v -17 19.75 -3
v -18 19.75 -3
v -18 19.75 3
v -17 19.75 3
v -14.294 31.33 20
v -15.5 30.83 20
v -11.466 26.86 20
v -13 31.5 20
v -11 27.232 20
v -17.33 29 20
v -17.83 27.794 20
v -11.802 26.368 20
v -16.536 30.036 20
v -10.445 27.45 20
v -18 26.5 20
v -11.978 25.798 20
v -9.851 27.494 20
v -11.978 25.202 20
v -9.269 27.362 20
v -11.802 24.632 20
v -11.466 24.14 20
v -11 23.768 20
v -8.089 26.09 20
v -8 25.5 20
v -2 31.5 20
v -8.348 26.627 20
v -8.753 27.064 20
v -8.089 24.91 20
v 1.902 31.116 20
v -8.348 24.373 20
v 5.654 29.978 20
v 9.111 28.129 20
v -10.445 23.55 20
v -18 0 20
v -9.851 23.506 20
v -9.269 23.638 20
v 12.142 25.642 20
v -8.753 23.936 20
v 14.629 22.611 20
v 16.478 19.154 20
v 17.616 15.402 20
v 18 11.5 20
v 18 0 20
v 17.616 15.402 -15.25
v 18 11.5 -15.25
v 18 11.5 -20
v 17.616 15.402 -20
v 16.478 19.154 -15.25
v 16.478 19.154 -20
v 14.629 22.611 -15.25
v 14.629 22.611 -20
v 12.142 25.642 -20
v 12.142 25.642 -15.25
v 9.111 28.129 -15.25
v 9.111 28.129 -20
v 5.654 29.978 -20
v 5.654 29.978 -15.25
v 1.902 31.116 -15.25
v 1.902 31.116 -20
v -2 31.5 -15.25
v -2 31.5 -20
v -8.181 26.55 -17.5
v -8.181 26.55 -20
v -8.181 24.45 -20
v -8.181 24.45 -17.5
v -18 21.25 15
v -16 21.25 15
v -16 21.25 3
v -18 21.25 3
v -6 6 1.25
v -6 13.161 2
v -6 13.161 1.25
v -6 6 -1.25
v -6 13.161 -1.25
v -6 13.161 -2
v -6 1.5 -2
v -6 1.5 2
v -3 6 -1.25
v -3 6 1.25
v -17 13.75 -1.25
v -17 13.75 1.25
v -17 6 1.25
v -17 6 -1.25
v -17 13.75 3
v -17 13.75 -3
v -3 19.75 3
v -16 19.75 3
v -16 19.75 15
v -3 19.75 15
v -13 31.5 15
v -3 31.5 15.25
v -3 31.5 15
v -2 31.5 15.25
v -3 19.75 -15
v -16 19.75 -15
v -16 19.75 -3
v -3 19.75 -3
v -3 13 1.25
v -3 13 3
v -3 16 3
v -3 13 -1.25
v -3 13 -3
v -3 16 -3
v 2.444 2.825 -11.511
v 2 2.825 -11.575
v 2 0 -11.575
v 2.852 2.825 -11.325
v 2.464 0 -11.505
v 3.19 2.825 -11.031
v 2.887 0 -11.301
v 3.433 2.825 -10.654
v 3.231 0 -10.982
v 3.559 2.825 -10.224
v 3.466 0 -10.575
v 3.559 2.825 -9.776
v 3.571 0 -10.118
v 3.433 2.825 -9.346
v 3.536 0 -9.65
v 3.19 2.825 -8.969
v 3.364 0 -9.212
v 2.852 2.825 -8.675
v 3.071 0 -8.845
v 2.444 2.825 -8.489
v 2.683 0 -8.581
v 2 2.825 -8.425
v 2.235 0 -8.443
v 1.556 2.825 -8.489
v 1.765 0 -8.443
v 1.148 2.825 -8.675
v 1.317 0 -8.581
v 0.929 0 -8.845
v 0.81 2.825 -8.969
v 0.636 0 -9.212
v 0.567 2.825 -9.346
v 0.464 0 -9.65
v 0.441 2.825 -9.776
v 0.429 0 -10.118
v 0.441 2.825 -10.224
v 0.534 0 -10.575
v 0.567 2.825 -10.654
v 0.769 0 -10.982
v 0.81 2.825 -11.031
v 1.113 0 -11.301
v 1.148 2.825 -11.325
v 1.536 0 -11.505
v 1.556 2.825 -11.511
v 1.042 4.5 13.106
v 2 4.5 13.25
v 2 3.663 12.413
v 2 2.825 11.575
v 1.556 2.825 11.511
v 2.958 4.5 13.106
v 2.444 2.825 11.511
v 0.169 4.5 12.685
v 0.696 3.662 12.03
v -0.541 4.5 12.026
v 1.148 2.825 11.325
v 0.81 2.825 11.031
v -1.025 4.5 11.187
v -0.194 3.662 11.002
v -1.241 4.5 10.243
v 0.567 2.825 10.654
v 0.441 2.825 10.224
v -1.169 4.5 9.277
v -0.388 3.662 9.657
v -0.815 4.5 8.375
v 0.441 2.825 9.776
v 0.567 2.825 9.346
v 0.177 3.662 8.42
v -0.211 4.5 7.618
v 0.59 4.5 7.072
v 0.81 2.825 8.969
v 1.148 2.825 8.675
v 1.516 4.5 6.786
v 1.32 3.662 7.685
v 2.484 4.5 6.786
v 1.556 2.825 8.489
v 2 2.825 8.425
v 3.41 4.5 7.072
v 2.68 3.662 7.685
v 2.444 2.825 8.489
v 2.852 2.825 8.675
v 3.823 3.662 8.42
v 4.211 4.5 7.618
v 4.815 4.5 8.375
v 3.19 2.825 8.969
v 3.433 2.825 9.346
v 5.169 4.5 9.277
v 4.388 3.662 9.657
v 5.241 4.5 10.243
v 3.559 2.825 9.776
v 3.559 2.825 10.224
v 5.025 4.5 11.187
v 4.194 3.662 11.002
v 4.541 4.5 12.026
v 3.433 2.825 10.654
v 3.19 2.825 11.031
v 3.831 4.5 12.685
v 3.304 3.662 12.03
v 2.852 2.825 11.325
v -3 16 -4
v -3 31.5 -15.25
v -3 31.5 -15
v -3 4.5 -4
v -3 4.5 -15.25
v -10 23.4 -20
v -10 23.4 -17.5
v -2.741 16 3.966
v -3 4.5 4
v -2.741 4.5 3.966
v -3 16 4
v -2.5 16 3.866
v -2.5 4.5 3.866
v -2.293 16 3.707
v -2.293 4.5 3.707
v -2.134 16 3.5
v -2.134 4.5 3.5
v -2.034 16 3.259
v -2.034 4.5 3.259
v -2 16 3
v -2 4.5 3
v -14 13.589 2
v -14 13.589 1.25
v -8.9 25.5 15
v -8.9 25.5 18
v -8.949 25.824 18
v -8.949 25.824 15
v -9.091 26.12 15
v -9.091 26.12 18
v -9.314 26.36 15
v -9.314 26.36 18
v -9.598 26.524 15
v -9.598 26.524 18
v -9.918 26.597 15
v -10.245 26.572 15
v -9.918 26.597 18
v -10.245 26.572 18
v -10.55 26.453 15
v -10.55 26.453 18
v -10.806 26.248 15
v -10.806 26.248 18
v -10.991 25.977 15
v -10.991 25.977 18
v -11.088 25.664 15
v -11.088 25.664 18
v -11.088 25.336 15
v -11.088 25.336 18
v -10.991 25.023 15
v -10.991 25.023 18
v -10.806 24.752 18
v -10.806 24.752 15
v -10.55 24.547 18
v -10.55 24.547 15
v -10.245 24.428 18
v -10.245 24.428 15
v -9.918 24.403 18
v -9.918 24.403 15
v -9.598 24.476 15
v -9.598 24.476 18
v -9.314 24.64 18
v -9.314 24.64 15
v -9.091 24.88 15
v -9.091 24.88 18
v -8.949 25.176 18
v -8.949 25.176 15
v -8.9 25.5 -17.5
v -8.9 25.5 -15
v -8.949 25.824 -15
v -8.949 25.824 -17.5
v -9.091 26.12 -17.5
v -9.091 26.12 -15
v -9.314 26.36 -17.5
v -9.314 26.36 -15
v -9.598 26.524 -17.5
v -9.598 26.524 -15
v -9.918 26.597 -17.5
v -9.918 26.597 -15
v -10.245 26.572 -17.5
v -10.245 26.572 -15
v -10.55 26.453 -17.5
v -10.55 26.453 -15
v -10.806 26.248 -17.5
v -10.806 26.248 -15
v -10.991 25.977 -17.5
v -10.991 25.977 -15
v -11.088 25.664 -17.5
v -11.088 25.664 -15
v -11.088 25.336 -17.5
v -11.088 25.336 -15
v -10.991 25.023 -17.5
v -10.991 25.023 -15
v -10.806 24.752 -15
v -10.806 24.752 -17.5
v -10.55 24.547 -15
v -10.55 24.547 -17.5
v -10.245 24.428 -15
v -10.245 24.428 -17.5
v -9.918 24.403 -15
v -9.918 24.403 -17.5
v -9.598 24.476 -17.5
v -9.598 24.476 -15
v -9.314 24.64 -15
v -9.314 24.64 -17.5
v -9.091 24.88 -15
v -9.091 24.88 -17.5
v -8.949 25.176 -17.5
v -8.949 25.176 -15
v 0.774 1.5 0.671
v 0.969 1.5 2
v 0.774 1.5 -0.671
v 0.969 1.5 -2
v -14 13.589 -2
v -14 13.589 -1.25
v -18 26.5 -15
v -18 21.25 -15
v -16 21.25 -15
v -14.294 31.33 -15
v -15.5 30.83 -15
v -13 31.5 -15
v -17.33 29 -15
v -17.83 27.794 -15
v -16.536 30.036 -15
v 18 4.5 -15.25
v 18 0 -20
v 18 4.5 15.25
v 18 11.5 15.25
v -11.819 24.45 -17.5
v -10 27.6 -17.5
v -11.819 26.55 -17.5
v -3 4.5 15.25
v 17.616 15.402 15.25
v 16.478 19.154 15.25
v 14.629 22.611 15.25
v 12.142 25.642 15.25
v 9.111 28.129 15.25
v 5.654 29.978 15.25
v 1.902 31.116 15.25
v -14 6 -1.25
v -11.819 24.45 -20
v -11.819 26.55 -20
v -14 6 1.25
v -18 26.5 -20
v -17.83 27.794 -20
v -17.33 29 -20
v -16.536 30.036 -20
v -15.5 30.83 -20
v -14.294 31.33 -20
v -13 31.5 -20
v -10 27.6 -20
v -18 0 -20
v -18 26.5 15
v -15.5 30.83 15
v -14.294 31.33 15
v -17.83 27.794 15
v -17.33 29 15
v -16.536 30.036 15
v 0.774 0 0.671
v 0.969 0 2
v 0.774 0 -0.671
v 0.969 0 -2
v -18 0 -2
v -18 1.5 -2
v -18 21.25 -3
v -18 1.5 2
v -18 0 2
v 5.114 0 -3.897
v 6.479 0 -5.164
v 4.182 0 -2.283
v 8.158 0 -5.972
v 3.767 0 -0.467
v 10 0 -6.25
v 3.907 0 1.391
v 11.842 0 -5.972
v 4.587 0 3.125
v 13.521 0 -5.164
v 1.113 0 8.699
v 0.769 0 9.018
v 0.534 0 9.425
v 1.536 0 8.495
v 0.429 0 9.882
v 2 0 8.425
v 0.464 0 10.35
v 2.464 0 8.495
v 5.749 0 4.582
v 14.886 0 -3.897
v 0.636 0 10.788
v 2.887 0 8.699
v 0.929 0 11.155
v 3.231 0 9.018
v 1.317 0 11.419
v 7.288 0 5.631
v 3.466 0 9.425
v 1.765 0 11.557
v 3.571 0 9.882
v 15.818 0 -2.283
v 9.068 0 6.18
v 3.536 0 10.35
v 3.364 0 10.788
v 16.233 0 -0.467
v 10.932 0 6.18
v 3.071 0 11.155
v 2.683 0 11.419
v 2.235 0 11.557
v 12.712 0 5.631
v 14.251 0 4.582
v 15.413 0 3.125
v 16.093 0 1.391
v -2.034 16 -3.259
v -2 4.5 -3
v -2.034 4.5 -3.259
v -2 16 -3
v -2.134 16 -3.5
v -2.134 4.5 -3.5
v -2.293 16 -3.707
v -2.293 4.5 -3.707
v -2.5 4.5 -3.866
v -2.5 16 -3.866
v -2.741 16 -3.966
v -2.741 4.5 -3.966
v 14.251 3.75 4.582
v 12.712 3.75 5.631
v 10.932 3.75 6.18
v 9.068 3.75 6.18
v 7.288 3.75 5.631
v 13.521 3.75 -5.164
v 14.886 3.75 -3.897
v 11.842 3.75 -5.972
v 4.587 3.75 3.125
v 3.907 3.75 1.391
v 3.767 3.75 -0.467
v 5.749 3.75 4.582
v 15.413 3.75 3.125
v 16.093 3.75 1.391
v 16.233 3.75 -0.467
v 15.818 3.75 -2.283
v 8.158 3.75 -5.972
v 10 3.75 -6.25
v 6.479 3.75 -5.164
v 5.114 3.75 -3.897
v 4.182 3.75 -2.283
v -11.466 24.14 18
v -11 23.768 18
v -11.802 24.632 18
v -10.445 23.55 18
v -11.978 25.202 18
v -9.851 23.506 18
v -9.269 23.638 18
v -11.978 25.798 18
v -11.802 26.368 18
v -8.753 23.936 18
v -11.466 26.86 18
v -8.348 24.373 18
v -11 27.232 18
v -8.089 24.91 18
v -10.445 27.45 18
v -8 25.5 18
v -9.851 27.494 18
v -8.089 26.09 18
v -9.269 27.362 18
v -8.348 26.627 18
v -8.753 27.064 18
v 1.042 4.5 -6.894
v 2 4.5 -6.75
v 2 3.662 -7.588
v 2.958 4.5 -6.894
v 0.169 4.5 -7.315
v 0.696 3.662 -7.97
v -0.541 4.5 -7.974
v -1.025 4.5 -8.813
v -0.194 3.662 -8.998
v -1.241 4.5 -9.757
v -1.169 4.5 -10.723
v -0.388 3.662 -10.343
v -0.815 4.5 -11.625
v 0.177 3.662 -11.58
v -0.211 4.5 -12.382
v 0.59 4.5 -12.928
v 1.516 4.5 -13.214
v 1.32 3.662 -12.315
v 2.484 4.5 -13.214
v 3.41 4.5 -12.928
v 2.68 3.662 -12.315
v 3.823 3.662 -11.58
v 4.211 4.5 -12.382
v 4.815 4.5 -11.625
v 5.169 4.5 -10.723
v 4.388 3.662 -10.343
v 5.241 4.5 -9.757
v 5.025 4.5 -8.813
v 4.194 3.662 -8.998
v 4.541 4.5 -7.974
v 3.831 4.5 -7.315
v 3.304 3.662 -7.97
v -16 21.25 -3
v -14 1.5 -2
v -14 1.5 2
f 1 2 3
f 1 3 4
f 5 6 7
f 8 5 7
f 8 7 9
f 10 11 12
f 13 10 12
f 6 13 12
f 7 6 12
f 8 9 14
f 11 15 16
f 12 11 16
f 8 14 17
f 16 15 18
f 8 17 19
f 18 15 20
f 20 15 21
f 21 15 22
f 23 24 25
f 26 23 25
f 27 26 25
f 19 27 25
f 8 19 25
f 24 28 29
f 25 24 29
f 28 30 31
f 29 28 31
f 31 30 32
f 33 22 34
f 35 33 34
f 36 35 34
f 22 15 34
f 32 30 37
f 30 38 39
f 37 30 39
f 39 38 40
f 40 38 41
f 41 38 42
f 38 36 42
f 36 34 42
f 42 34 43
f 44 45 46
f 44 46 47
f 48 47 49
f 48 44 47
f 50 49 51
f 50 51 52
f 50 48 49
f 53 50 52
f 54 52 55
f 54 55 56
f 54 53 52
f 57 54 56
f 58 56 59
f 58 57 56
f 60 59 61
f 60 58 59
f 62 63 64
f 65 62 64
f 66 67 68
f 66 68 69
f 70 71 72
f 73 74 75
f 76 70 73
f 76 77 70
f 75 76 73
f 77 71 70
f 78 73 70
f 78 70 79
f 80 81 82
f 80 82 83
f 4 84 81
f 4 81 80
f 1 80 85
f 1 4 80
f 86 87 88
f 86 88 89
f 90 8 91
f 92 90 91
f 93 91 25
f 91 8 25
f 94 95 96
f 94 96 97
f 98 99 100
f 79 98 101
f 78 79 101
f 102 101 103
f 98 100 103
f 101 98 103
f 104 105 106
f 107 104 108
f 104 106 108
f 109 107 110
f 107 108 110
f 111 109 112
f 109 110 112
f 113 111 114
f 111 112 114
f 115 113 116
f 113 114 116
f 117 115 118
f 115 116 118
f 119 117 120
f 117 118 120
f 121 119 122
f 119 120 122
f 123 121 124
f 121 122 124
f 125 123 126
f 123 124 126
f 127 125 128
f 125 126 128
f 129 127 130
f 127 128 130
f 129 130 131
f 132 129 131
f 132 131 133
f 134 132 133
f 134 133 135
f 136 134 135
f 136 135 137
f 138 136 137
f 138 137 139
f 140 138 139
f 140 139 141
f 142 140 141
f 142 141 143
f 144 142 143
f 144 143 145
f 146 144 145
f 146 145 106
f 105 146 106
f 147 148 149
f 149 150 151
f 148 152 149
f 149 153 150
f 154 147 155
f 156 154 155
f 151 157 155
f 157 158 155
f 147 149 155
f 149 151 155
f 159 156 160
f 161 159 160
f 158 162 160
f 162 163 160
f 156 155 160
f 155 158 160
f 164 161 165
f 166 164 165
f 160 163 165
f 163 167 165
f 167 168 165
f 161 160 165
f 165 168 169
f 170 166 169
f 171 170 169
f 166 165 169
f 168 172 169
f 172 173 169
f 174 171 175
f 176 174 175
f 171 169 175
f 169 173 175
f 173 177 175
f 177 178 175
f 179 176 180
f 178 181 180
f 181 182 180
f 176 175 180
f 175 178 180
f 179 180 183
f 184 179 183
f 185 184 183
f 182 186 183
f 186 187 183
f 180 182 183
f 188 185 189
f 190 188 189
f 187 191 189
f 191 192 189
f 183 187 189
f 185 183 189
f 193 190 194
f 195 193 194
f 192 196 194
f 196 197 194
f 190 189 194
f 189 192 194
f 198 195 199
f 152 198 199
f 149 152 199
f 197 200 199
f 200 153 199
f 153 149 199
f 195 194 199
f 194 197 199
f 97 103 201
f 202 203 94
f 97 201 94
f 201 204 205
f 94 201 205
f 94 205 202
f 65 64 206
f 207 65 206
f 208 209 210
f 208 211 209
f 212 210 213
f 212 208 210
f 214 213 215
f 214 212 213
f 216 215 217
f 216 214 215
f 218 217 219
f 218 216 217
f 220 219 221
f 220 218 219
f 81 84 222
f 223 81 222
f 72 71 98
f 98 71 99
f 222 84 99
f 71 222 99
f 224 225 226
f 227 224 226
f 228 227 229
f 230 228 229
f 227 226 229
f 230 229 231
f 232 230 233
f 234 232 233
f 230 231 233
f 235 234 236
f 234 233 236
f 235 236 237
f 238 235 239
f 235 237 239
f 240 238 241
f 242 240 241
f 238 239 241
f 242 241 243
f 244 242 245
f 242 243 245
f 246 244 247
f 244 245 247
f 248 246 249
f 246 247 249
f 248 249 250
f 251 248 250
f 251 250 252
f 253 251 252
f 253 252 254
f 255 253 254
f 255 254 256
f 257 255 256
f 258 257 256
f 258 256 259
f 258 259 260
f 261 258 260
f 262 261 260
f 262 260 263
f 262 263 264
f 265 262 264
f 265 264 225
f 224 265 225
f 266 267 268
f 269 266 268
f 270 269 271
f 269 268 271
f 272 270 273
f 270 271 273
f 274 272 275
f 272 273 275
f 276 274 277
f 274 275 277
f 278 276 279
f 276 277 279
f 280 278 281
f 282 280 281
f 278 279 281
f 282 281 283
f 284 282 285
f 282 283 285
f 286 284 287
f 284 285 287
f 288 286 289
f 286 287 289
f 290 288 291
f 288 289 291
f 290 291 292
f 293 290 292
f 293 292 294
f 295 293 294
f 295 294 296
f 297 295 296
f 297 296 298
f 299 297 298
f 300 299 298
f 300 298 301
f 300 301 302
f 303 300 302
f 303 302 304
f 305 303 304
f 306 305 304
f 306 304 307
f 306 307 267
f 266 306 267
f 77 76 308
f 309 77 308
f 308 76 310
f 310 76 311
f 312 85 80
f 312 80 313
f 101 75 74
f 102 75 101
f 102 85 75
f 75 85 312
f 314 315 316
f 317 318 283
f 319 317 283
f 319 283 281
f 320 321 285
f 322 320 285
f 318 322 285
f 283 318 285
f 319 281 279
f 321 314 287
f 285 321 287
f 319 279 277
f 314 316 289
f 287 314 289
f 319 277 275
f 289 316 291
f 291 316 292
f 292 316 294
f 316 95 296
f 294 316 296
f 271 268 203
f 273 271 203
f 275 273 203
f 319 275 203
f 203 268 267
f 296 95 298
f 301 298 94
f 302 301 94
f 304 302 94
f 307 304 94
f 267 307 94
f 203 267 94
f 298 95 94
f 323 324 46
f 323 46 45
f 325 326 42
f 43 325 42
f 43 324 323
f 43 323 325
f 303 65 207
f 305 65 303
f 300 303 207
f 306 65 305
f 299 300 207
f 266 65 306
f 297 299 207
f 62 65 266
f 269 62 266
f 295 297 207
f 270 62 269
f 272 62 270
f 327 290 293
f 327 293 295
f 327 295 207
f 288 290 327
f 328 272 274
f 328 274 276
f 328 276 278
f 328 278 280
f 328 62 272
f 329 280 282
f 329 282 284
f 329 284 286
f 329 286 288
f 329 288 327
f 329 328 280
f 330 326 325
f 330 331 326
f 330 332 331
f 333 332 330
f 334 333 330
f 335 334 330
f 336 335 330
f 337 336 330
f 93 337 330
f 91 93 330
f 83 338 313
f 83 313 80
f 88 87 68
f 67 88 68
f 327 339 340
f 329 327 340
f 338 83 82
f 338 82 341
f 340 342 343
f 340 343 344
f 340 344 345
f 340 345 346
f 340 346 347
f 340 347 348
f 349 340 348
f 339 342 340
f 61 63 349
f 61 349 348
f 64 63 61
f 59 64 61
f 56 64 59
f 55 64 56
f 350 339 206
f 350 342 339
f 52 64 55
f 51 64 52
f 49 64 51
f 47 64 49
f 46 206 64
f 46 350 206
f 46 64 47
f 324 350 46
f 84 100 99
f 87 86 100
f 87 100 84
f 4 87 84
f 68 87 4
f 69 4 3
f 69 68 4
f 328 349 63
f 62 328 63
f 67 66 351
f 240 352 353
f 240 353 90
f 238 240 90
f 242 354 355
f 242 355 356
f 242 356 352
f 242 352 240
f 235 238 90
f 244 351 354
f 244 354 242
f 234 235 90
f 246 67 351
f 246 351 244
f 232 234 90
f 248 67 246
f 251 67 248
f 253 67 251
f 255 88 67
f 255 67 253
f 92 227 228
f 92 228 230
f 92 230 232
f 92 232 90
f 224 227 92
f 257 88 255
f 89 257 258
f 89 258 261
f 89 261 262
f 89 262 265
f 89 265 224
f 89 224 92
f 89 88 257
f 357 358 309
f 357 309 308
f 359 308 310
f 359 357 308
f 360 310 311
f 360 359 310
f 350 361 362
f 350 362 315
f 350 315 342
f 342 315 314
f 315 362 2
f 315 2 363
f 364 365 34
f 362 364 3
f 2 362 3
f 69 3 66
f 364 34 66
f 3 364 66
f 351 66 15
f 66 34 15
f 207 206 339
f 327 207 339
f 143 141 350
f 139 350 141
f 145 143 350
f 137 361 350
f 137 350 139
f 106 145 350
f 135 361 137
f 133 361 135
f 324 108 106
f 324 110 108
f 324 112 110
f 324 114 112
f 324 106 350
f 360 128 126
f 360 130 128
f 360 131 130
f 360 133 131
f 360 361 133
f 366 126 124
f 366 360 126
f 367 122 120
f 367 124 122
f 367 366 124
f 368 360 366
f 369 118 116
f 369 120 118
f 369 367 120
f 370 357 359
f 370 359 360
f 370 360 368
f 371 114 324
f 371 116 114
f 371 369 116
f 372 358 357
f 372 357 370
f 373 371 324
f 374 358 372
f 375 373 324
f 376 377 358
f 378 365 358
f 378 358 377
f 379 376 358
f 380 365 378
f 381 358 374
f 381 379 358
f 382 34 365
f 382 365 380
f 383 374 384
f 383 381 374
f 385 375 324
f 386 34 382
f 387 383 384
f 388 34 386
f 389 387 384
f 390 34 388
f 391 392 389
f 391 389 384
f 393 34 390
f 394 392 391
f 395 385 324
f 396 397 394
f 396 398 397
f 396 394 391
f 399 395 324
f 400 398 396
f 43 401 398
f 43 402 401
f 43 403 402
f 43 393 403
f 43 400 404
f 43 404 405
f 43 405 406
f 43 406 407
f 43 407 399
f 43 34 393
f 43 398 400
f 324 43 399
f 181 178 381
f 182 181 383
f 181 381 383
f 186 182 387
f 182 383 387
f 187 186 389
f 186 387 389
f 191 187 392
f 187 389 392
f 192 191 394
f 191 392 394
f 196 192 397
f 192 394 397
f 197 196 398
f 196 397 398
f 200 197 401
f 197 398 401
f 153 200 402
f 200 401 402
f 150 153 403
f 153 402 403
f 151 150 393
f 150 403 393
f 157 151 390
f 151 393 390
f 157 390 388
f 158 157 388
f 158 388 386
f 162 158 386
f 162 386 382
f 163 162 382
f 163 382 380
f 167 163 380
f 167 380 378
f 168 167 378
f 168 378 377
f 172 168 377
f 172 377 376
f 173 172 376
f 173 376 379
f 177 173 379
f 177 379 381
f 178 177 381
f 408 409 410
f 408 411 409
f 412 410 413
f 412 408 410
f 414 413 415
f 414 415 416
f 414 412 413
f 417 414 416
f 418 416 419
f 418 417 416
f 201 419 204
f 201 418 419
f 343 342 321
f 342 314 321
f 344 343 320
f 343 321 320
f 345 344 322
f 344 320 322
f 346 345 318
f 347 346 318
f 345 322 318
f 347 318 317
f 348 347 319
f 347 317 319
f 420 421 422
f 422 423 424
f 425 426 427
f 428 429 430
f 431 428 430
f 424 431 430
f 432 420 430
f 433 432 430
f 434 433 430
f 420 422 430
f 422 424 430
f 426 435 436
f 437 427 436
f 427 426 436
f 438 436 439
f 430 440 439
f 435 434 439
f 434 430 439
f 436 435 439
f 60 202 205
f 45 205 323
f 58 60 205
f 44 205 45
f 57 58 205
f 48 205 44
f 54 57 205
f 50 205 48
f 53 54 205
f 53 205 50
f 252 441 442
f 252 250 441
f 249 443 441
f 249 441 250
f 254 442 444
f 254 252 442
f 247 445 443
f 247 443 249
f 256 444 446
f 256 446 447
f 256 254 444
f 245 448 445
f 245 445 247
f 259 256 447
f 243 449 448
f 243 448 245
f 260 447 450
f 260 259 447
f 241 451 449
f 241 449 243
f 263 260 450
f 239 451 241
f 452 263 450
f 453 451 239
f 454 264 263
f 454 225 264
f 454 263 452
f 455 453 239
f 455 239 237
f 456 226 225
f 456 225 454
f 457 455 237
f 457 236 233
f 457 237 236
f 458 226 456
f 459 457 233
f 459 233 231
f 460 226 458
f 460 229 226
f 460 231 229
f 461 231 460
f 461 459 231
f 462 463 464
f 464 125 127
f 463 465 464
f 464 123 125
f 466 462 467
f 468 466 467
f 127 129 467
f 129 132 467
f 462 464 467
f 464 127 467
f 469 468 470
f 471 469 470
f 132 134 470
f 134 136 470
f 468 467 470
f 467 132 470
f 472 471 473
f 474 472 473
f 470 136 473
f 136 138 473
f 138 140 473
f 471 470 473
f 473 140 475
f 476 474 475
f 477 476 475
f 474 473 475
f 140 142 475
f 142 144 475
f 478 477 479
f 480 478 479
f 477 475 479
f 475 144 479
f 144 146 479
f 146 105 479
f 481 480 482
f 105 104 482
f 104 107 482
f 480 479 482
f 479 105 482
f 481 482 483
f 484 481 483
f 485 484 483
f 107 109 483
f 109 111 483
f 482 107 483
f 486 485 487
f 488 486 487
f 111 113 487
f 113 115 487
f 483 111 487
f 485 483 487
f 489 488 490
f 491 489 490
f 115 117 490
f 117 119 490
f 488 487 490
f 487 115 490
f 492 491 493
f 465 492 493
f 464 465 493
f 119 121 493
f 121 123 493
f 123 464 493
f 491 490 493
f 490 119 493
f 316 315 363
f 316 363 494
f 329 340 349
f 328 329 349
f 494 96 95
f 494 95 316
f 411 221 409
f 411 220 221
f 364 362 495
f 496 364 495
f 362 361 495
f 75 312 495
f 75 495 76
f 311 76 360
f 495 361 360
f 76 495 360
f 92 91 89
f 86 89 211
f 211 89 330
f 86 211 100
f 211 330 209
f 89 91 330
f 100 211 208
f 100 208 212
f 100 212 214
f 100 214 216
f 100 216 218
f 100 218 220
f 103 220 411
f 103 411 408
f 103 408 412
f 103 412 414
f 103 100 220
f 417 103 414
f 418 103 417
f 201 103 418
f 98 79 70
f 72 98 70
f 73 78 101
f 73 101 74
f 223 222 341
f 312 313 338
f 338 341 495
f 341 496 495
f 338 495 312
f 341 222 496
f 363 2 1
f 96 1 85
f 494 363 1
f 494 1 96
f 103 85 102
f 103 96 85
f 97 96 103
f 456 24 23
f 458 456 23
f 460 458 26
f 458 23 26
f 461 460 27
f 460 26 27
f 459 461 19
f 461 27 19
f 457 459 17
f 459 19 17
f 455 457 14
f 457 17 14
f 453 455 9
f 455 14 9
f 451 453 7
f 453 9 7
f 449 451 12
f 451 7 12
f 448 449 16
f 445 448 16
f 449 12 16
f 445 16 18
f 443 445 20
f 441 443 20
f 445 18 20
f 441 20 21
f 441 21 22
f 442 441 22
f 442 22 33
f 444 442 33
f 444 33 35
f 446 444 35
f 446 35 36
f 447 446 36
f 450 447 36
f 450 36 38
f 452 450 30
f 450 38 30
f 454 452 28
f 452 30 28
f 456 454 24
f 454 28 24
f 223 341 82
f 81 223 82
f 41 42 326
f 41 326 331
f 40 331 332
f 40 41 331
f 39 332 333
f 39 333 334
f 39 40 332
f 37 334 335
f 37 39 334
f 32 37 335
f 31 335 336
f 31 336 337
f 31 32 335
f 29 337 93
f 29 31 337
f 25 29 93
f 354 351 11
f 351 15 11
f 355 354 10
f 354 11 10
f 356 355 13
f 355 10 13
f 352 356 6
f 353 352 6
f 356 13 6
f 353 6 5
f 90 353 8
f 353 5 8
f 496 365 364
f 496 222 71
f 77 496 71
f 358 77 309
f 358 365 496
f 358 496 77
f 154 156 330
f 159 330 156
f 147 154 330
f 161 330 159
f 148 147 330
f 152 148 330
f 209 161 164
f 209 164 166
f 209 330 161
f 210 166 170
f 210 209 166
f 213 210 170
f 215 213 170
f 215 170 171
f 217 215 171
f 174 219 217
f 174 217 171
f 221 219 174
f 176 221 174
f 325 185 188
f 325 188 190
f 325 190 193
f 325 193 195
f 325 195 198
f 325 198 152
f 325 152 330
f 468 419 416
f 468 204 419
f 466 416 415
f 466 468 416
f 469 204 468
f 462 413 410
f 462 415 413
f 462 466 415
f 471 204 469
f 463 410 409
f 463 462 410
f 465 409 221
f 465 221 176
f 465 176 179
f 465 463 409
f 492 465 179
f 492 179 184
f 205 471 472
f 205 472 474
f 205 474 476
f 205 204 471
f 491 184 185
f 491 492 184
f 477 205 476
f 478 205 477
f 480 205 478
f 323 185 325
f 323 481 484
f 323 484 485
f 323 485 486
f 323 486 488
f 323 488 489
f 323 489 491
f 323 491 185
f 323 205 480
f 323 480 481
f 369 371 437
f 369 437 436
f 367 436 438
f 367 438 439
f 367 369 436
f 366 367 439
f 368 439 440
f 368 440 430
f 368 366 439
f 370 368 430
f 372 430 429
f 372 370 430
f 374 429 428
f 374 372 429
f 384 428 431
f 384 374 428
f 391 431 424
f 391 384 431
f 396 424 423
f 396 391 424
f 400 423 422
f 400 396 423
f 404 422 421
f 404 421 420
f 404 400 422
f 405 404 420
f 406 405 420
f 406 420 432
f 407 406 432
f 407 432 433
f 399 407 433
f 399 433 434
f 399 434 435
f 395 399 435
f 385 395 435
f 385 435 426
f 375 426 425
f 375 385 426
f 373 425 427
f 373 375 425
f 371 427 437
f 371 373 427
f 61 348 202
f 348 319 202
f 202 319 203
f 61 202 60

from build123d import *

# Parameters (mm, degrees)
BASE_W                              = 36
BASE_H                              = 30
BOSS_EXTRUDE1_DEPTH                 = 4.5
WALLS_W                             = 36
WALLS_H                             = 5
WALLS_EXT_DEPTH                     = 31.5
SWITCH_BLOCK_W                      = 15
SWITCH_BLOCK_H                      = 30
SWITCH_BLOCK_EXT_DEPTH              = 15.25
MAGNET_POCKET_R                     = 6.25
MAGNET_POCKET_CUT_DEPTH             = 3.75
FILLET1_R                           = 5
FILLET2_R                           = 5
FILLET3_R                           = 20
FILLET4_R                           = 20
SWITCH_PLACE_W                      = 14
SWITCH_PLACE_H                      = 6
SWITCH_POCKET_DEPTH                 = 6.75
SWITCH_CONTACTS_W                   = 14
SWITCH_CONTACTS_H                   = 2.5
SWITCH_LEADS_DEPTH                  = 7
SWITCH_ANGLE_LEFT_DEPTH             = 1.75
SWITCH_ANGLE_RIGHT_DEPTH            = 1.75
WIRE_GUIDE_W                        = 8
WIRE_GUIDE_H                        = 4
WIRE_PASS_THROUGH_DEPTH             = 6
WIRE_PASS_THROUGH_DIRECTION_2_REACH = 39.071
WIRE_CHANNEL_OUTLINE_W              = 4
WIRE_CHANNEL_OUTLINE_H              = 4
WIRE_CHANNEL_DEPTH                  = 1.5
ACHSE_R                             = 1.1
M2_ACHSE_DEPTH                      = 55.002314765
M2_NUT_DEPTH                        = 2.5
SKETCH2_R                           = 1.575
M3_MOUNTING_SCREWS_DEPTH            = 4.5
SKETCH9_W                           = 2
SKETCH9_H                           = 1.5
BOSS_EXTRUDE3_DEPTH                 = 12
SKETCH10_W                          = 2
SKETCH10_H                          = 1.5
BOSS_EXTRUDE4_DEPTH                 = 12
SKETCH18_W                          = 8
SKETCH18_H                          = 11.5
BOSS_EXTRUDE5_DEPTH                 = 1
FILLET5_R                           = 1
FILLET6_R                           = 1
SKETCH19_W                          = 21
SKETCH19_H                          = 27
CUT_EXTRUDE1_DEPTH                  = 0.25
SKETCH20_W                          = 21
SKETCH20_H                          = 27
CUT_EXTRUDE2_DEPTH                  = 0.25
SKETCH21_R                          = 2
CUT_EXTRUDE3_DEPTH                  = 2


# Read off the part's stored shape, not the designer's step: Wire Channel
with BuildPart() as part:
    # Base → Boss-Extrude1 (new body)
    with BuildSketch(Plane(origin=(0, 0, 0), x_dir=(1, 0, 0), z_dir=(0, 1, 0))):
        Rectangle(BASE_W, BASE_H)
    extrude(amount=BOSS_EXTRUDE1_DEPTH)

    # Walls → Walls Ext (add)
    with BuildSketch(Plane.XZ):
        with Locations((0, 17.5)):
            Rectangle(WALLS_W, WALLS_H)
        with Locations((0, -17.5)):
            Rectangle(WALLS_W, WALLS_H)
    extrude(amount=-WALLS_EXT_DEPTH)

    # Switch Block → Switch Block Ext (add)
    with BuildSketch(Plane(origin=(0, 4.5, 0), x_dir=(1, 0, 0), z_dir=(0, 1, 0))):
        with Locations((-10.5, 0)):
            Rectangle(SWITCH_BLOCK_W, SWITCH_BLOCK_H)
    extrude(amount=SWITCH_BLOCK_EXT_DEPTH)

    # Magnet Pocket → Magnet Pocket Cut (cut)
    with BuildSketch(Plane(origin=(0, 0, 0), x_dir=(1, 0, 0), z_dir=(0, 1, 0))):
        with Locations(Location((10, 0, 0), (0, 0, 90))):
            Circle(MAGNET_POCKET_R)
    extrude(amount=MAGNET_POCKET_CUT_DEPTH, mode=Mode.SUBTRACT)

    # Fillet1
    fillet1_edges = [part.edges().sort_by_distance(p)[0] for p in [
        (-18, 31.5, -17.5),
    ]]
    fillet(fillet1_edges, radius=FILLET1_R)

    # Fillet2
    fillet2_edges = [part.edges().sort_by_distance(p)[0] for p in [
        (-18, 31.5, 17.5),
    ]]
    fillet(fillet2_edges, radius=FILLET2_R)

    # Fillet3
    fillet3_edges = [part.edges().sort_by_distance(p)[0] for p in [
        (18, 31.5, -17.5),
    ]]
    fillet(fillet3_edges, radius=FILLET3_R)

    # Fillet4
    fillet4_edges = [part.edges().sort_by_distance(p)[0] for p in [
        (18, 31.5, 17.5),
    ]]
    fillet(fillet4_edges, radius=FILLET4_R)

    # Switch Place → Switch Pocket (cut)
    with BuildSketch(Plane(origin=(0, 19.75, 0), x_dir=(1, 0, 0), z_dir=(0, 1, 0))):
        with Locations((-10, 0)):
            Rectangle(SWITCH_PLACE_W, SWITCH_PLACE_H)
    extrude(amount=-SWITCH_POCKET_DEPTH, mode=Mode.SUBTRACT)

    # Switch Contacts → Switch Leads (cut)
    with BuildSketch(Plane(origin=(0, 13, 0), x_dir=(1, 0, 0), z_dir=(0, 1, 0))):
        with Locations((-10, 0)):
            Rectangle(SWITCH_CONTACTS_W, SWITCH_CONTACTS_H)
    extrude(amount=-SWITCH_LEADS_DEPTH, mode=Mode.SUBTRACT)

    # Sketch16 → Switch Angle Left (add)
    with BuildSketch(Plane(origin=(0, 0, 3), x_dir=(-1, 0, 0), z_dir=(0, 0, -1))):
        Polygon((17, 13), (17, 13.75), (3, 13), align=None)
    extrude(amount=SWITCH_ANGLE_LEFT_DEPTH)

    # Sketch17 → Switch Angle Right (add)
    with BuildSketch(Plane.XY.offset(-3)):
        Polygon((-17, 13), (-17, 13.75), (-3, 13), align=None)
    extrude(amount=SWITCH_ANGLE_RIGHT_DEPTH)

    # Wire Guide → Wire pass through (cut)
    with BuildSketch(Plane(origin=(0, 6, 0), x_dir=(1, 0, 0), z_dir=(0, 1, 0))):
        with Locations((-10, 0)):
            Rectangle(WIRE_GUIDE_W, WIRE_GUIDE_H)
    extrude(amount=-WIRE_PASS_THROUGH_DEPTH, mode=Mode.SUBTRACT)

    # Wire pass through direction 2: up to this plane
    wire_pass_through_direction_2_end = Plane(origin=(-17, 13.75, -12.770074893), z_dir=(-0.05349472137161193, -0.9985681322700889, 0))
    # Wire Guide → Wire pass through direction 2 (cut, up to the surface)
    with BuildSketch(Plane(origin=(0, 6, 0), x_dir=(1, 0, 0), z_dir=(0, 1, 0)), mode=Mode.PRIVATE) as wire_pass_through_direction_2_sk1:
        with Locations((-10, 0)):
            Rectangle(WIRE_GUIDE_W, WIRE_GUIDE_H)
    wire_pass_through_direction_2_tool1 = split(extrude(wire_pass_through_direction_2_sk1.sketch, amount=WIRE_PASS_THROUGH_DIRECTION_2_REACH, mode=Mode.PRIVATE), bisect_by=wire_pass_through_direction_2_end, keep=Keep.BOTH, mode=Mode.PRIVATE)
    add(wire_pass_through_direction_2_tool1.solids().sort_by_distance((-10, 6, 0))[0], mode=Mode.SUBTRACT)

    # Wire Channel outline → Wire Channel (cut)
    with BuildSketch(Plane(origin=(0, 0, 0), x_dir=(1, 0, 0), z_dir=(0, 1, 0))):
        with Locations((-16, 0)):
            Rectangle(WIRE_CHANNEL_OUTLINE_W, WIRE_CHANNEL_OUTLINE_H)
        with BuildLine():
            Line((-6, 2), (-6, -2))
            Line((-6, -2), (0.968804066, -2))
            ThreePointArc((0.968804066, -2), (0.75, 0), (0.968804066, 2))
            Line((0.968804066, 2), (-6, 2))
        make_face()
    extrude(amount=WIRE_CHANNEL_DEPTH, mode=Mode.SUBTRACT)

    # Achse → M2 Achse (cut, through all)
    with BuildSketch(Plane.XY.offset(20)):
        with Locations((-10, 25.5)):
            Circle(ACHSE_R)
    extrude(amount=-M2_ACHSE_DEPTH, mode=Mode.SUBTRACT)

    # Sketch5 → M2 Nut (cut)
    with BuildSketch(Plane(origin=(0, 0, -20), x_dir=(-1, 0, 0), z_dir=(0, 0, -1))):
        Polygon((10, 27.6), (8.181346652, 26.55), (8.181346652, 24.45), (10, 23.4), (11.818653348, 24.45), (11.818653348, 26.55), align=None)
    extrude(amount=-M2_NUT_DEPTH, mode=Mode.SUBTRACT)

    # Sketch2 → M3 Mounting Screws (cut)
    with BuildSketch(Plane.XZ):
        with Locations(Location((2, -10, 0), (0, 0, 270))):
            Circle(SKETCH2_R)
        with Locations(Location((2, 10, 0), (0, 0, 270))):
            Circle(SKETCH2_R)
    extrude(amount=-M3_MOUNTING_SCREWS_DEPTH, mode=Mode.SUBTRACT)

    # M3 Senkkopf cone 1 section (through the dimple's axis) → M3 Senkkopf (revolve, cut)
    with BuildSketch(Plane(origin=(2, 4.5, 10), x_dir=(0, 0, 1), z_dir=(1, 0, 0))):
        Polygon((0, 0), (3.25, 0), (0, 3.25), align=None)
    revolve(axis=Axis((2, 4.5, 10), (0, -1, 0)), mode=Mode.SUBTRACT)

    # M3 Senkkopf cone 2 section (through the dimple's axis) → M3 Senkkopf cone 2 (revolve, cut)
    with BuildSketch(Plane(origin=(2, 4.5, -10), x_dir=(0, 0, 1), z_dir=(1, 0, 0))):
        Polygon((0, 0), (3.25, 0), (0, 3.25), align=None)
    revolve(axis=Axis((2, 4.5, -10), (0, -1, 0)), mode=Mode.SUBTRACT)

    # Sketch9 → Boss-Extrude3 (add)
    with BuildSketch(Plane.XY.offset(-15)):
        with Locations((-17, 20.5)):
            Rectangle(SKETCH9_W, SKETCH9_H)
    extrude(amount=BOSS_EXTRUDE3_DEPTH)

    # Sketch10 → Boss-Extrude4 (add)
    with BuildSketch(Plane(origin=(0, 0, 15), x_dir=(-1, 0, 0), z_dir=(0, 0, -1))):
        with Locations((17, 20.5)):
            Rectangle(SKETCH10_W, SKETCH10_H)
    extrude(amount=BOSS_EXTRUDE4_DEPTH)

    # Sketch18 → Boss-Extrude5 (add)
    with BuildSketch(Plane(origin=(-3, 0, 0), x_dir=(0, 0, -1), z_dir=(1, 0, 0))):
        with Locations((0, 10.25)):
            Rectangle(SKETCH18_W, SKETCH18_H)
    extrude(amount=BOSS_EXTRUDE5_DEPTH)

    # Fillet5
    fillet5_edges = [part.edges().sort_by_distance(p)[0] for p in [
        (-2, 10.25, 4),
    ]]
    fillet(fillet5_edges, radius=FILLET5_R - 0.0001)  # a hair under: the kernel refuses the full size

    # Fillet6
    fillet6_edges = [part.edges().sort_by_distance(p)[0] for p in [
        (-2, 10.25, -4),
    ]]
    fillet(fillet6_edges, radius=FILLET6_R - 0.0001)  # a hair under: the kernel refuses the full size

    # Sketch19 → Cut-Extrude1 (cut)
    with BuildSketch(Plane(origin=(0, 0, 15), x_dir=(-1, 0, 0), z_dir=(0, 0, -1))):
        with Locations((-7.5, 18)):
            Rectangle(SKETCH19_W, SKETCH19_H)
    extrude(amount=-CUT_EXTRUDE1_DEPTH, mode=Mode.SUBTRACT)

    # Sketch20 → Cut-Extrude2 (cut)
    with BuildSketch(Plane.XY.offset(-15)):
        with Locations((7.5, 18)):
            Rectangle(SKETCH20_W, SKETCH20_H)
    extrude(amount=-CUT_EXTRUDE2_DEPTH, mode=Mode.SUBTRACT)

    # Sketch21 → Cut-Extrude3 (cut)
    with BuildSketch(Plane.XY.offset(20)):
        with Locations((-10, 25.5)):
            Circle(SKETCH21_R)
    extrude(amount=-CUT_EXTRUDE3_DEPTH, mode=Mode.SUBTRACT)


solid = part.part
